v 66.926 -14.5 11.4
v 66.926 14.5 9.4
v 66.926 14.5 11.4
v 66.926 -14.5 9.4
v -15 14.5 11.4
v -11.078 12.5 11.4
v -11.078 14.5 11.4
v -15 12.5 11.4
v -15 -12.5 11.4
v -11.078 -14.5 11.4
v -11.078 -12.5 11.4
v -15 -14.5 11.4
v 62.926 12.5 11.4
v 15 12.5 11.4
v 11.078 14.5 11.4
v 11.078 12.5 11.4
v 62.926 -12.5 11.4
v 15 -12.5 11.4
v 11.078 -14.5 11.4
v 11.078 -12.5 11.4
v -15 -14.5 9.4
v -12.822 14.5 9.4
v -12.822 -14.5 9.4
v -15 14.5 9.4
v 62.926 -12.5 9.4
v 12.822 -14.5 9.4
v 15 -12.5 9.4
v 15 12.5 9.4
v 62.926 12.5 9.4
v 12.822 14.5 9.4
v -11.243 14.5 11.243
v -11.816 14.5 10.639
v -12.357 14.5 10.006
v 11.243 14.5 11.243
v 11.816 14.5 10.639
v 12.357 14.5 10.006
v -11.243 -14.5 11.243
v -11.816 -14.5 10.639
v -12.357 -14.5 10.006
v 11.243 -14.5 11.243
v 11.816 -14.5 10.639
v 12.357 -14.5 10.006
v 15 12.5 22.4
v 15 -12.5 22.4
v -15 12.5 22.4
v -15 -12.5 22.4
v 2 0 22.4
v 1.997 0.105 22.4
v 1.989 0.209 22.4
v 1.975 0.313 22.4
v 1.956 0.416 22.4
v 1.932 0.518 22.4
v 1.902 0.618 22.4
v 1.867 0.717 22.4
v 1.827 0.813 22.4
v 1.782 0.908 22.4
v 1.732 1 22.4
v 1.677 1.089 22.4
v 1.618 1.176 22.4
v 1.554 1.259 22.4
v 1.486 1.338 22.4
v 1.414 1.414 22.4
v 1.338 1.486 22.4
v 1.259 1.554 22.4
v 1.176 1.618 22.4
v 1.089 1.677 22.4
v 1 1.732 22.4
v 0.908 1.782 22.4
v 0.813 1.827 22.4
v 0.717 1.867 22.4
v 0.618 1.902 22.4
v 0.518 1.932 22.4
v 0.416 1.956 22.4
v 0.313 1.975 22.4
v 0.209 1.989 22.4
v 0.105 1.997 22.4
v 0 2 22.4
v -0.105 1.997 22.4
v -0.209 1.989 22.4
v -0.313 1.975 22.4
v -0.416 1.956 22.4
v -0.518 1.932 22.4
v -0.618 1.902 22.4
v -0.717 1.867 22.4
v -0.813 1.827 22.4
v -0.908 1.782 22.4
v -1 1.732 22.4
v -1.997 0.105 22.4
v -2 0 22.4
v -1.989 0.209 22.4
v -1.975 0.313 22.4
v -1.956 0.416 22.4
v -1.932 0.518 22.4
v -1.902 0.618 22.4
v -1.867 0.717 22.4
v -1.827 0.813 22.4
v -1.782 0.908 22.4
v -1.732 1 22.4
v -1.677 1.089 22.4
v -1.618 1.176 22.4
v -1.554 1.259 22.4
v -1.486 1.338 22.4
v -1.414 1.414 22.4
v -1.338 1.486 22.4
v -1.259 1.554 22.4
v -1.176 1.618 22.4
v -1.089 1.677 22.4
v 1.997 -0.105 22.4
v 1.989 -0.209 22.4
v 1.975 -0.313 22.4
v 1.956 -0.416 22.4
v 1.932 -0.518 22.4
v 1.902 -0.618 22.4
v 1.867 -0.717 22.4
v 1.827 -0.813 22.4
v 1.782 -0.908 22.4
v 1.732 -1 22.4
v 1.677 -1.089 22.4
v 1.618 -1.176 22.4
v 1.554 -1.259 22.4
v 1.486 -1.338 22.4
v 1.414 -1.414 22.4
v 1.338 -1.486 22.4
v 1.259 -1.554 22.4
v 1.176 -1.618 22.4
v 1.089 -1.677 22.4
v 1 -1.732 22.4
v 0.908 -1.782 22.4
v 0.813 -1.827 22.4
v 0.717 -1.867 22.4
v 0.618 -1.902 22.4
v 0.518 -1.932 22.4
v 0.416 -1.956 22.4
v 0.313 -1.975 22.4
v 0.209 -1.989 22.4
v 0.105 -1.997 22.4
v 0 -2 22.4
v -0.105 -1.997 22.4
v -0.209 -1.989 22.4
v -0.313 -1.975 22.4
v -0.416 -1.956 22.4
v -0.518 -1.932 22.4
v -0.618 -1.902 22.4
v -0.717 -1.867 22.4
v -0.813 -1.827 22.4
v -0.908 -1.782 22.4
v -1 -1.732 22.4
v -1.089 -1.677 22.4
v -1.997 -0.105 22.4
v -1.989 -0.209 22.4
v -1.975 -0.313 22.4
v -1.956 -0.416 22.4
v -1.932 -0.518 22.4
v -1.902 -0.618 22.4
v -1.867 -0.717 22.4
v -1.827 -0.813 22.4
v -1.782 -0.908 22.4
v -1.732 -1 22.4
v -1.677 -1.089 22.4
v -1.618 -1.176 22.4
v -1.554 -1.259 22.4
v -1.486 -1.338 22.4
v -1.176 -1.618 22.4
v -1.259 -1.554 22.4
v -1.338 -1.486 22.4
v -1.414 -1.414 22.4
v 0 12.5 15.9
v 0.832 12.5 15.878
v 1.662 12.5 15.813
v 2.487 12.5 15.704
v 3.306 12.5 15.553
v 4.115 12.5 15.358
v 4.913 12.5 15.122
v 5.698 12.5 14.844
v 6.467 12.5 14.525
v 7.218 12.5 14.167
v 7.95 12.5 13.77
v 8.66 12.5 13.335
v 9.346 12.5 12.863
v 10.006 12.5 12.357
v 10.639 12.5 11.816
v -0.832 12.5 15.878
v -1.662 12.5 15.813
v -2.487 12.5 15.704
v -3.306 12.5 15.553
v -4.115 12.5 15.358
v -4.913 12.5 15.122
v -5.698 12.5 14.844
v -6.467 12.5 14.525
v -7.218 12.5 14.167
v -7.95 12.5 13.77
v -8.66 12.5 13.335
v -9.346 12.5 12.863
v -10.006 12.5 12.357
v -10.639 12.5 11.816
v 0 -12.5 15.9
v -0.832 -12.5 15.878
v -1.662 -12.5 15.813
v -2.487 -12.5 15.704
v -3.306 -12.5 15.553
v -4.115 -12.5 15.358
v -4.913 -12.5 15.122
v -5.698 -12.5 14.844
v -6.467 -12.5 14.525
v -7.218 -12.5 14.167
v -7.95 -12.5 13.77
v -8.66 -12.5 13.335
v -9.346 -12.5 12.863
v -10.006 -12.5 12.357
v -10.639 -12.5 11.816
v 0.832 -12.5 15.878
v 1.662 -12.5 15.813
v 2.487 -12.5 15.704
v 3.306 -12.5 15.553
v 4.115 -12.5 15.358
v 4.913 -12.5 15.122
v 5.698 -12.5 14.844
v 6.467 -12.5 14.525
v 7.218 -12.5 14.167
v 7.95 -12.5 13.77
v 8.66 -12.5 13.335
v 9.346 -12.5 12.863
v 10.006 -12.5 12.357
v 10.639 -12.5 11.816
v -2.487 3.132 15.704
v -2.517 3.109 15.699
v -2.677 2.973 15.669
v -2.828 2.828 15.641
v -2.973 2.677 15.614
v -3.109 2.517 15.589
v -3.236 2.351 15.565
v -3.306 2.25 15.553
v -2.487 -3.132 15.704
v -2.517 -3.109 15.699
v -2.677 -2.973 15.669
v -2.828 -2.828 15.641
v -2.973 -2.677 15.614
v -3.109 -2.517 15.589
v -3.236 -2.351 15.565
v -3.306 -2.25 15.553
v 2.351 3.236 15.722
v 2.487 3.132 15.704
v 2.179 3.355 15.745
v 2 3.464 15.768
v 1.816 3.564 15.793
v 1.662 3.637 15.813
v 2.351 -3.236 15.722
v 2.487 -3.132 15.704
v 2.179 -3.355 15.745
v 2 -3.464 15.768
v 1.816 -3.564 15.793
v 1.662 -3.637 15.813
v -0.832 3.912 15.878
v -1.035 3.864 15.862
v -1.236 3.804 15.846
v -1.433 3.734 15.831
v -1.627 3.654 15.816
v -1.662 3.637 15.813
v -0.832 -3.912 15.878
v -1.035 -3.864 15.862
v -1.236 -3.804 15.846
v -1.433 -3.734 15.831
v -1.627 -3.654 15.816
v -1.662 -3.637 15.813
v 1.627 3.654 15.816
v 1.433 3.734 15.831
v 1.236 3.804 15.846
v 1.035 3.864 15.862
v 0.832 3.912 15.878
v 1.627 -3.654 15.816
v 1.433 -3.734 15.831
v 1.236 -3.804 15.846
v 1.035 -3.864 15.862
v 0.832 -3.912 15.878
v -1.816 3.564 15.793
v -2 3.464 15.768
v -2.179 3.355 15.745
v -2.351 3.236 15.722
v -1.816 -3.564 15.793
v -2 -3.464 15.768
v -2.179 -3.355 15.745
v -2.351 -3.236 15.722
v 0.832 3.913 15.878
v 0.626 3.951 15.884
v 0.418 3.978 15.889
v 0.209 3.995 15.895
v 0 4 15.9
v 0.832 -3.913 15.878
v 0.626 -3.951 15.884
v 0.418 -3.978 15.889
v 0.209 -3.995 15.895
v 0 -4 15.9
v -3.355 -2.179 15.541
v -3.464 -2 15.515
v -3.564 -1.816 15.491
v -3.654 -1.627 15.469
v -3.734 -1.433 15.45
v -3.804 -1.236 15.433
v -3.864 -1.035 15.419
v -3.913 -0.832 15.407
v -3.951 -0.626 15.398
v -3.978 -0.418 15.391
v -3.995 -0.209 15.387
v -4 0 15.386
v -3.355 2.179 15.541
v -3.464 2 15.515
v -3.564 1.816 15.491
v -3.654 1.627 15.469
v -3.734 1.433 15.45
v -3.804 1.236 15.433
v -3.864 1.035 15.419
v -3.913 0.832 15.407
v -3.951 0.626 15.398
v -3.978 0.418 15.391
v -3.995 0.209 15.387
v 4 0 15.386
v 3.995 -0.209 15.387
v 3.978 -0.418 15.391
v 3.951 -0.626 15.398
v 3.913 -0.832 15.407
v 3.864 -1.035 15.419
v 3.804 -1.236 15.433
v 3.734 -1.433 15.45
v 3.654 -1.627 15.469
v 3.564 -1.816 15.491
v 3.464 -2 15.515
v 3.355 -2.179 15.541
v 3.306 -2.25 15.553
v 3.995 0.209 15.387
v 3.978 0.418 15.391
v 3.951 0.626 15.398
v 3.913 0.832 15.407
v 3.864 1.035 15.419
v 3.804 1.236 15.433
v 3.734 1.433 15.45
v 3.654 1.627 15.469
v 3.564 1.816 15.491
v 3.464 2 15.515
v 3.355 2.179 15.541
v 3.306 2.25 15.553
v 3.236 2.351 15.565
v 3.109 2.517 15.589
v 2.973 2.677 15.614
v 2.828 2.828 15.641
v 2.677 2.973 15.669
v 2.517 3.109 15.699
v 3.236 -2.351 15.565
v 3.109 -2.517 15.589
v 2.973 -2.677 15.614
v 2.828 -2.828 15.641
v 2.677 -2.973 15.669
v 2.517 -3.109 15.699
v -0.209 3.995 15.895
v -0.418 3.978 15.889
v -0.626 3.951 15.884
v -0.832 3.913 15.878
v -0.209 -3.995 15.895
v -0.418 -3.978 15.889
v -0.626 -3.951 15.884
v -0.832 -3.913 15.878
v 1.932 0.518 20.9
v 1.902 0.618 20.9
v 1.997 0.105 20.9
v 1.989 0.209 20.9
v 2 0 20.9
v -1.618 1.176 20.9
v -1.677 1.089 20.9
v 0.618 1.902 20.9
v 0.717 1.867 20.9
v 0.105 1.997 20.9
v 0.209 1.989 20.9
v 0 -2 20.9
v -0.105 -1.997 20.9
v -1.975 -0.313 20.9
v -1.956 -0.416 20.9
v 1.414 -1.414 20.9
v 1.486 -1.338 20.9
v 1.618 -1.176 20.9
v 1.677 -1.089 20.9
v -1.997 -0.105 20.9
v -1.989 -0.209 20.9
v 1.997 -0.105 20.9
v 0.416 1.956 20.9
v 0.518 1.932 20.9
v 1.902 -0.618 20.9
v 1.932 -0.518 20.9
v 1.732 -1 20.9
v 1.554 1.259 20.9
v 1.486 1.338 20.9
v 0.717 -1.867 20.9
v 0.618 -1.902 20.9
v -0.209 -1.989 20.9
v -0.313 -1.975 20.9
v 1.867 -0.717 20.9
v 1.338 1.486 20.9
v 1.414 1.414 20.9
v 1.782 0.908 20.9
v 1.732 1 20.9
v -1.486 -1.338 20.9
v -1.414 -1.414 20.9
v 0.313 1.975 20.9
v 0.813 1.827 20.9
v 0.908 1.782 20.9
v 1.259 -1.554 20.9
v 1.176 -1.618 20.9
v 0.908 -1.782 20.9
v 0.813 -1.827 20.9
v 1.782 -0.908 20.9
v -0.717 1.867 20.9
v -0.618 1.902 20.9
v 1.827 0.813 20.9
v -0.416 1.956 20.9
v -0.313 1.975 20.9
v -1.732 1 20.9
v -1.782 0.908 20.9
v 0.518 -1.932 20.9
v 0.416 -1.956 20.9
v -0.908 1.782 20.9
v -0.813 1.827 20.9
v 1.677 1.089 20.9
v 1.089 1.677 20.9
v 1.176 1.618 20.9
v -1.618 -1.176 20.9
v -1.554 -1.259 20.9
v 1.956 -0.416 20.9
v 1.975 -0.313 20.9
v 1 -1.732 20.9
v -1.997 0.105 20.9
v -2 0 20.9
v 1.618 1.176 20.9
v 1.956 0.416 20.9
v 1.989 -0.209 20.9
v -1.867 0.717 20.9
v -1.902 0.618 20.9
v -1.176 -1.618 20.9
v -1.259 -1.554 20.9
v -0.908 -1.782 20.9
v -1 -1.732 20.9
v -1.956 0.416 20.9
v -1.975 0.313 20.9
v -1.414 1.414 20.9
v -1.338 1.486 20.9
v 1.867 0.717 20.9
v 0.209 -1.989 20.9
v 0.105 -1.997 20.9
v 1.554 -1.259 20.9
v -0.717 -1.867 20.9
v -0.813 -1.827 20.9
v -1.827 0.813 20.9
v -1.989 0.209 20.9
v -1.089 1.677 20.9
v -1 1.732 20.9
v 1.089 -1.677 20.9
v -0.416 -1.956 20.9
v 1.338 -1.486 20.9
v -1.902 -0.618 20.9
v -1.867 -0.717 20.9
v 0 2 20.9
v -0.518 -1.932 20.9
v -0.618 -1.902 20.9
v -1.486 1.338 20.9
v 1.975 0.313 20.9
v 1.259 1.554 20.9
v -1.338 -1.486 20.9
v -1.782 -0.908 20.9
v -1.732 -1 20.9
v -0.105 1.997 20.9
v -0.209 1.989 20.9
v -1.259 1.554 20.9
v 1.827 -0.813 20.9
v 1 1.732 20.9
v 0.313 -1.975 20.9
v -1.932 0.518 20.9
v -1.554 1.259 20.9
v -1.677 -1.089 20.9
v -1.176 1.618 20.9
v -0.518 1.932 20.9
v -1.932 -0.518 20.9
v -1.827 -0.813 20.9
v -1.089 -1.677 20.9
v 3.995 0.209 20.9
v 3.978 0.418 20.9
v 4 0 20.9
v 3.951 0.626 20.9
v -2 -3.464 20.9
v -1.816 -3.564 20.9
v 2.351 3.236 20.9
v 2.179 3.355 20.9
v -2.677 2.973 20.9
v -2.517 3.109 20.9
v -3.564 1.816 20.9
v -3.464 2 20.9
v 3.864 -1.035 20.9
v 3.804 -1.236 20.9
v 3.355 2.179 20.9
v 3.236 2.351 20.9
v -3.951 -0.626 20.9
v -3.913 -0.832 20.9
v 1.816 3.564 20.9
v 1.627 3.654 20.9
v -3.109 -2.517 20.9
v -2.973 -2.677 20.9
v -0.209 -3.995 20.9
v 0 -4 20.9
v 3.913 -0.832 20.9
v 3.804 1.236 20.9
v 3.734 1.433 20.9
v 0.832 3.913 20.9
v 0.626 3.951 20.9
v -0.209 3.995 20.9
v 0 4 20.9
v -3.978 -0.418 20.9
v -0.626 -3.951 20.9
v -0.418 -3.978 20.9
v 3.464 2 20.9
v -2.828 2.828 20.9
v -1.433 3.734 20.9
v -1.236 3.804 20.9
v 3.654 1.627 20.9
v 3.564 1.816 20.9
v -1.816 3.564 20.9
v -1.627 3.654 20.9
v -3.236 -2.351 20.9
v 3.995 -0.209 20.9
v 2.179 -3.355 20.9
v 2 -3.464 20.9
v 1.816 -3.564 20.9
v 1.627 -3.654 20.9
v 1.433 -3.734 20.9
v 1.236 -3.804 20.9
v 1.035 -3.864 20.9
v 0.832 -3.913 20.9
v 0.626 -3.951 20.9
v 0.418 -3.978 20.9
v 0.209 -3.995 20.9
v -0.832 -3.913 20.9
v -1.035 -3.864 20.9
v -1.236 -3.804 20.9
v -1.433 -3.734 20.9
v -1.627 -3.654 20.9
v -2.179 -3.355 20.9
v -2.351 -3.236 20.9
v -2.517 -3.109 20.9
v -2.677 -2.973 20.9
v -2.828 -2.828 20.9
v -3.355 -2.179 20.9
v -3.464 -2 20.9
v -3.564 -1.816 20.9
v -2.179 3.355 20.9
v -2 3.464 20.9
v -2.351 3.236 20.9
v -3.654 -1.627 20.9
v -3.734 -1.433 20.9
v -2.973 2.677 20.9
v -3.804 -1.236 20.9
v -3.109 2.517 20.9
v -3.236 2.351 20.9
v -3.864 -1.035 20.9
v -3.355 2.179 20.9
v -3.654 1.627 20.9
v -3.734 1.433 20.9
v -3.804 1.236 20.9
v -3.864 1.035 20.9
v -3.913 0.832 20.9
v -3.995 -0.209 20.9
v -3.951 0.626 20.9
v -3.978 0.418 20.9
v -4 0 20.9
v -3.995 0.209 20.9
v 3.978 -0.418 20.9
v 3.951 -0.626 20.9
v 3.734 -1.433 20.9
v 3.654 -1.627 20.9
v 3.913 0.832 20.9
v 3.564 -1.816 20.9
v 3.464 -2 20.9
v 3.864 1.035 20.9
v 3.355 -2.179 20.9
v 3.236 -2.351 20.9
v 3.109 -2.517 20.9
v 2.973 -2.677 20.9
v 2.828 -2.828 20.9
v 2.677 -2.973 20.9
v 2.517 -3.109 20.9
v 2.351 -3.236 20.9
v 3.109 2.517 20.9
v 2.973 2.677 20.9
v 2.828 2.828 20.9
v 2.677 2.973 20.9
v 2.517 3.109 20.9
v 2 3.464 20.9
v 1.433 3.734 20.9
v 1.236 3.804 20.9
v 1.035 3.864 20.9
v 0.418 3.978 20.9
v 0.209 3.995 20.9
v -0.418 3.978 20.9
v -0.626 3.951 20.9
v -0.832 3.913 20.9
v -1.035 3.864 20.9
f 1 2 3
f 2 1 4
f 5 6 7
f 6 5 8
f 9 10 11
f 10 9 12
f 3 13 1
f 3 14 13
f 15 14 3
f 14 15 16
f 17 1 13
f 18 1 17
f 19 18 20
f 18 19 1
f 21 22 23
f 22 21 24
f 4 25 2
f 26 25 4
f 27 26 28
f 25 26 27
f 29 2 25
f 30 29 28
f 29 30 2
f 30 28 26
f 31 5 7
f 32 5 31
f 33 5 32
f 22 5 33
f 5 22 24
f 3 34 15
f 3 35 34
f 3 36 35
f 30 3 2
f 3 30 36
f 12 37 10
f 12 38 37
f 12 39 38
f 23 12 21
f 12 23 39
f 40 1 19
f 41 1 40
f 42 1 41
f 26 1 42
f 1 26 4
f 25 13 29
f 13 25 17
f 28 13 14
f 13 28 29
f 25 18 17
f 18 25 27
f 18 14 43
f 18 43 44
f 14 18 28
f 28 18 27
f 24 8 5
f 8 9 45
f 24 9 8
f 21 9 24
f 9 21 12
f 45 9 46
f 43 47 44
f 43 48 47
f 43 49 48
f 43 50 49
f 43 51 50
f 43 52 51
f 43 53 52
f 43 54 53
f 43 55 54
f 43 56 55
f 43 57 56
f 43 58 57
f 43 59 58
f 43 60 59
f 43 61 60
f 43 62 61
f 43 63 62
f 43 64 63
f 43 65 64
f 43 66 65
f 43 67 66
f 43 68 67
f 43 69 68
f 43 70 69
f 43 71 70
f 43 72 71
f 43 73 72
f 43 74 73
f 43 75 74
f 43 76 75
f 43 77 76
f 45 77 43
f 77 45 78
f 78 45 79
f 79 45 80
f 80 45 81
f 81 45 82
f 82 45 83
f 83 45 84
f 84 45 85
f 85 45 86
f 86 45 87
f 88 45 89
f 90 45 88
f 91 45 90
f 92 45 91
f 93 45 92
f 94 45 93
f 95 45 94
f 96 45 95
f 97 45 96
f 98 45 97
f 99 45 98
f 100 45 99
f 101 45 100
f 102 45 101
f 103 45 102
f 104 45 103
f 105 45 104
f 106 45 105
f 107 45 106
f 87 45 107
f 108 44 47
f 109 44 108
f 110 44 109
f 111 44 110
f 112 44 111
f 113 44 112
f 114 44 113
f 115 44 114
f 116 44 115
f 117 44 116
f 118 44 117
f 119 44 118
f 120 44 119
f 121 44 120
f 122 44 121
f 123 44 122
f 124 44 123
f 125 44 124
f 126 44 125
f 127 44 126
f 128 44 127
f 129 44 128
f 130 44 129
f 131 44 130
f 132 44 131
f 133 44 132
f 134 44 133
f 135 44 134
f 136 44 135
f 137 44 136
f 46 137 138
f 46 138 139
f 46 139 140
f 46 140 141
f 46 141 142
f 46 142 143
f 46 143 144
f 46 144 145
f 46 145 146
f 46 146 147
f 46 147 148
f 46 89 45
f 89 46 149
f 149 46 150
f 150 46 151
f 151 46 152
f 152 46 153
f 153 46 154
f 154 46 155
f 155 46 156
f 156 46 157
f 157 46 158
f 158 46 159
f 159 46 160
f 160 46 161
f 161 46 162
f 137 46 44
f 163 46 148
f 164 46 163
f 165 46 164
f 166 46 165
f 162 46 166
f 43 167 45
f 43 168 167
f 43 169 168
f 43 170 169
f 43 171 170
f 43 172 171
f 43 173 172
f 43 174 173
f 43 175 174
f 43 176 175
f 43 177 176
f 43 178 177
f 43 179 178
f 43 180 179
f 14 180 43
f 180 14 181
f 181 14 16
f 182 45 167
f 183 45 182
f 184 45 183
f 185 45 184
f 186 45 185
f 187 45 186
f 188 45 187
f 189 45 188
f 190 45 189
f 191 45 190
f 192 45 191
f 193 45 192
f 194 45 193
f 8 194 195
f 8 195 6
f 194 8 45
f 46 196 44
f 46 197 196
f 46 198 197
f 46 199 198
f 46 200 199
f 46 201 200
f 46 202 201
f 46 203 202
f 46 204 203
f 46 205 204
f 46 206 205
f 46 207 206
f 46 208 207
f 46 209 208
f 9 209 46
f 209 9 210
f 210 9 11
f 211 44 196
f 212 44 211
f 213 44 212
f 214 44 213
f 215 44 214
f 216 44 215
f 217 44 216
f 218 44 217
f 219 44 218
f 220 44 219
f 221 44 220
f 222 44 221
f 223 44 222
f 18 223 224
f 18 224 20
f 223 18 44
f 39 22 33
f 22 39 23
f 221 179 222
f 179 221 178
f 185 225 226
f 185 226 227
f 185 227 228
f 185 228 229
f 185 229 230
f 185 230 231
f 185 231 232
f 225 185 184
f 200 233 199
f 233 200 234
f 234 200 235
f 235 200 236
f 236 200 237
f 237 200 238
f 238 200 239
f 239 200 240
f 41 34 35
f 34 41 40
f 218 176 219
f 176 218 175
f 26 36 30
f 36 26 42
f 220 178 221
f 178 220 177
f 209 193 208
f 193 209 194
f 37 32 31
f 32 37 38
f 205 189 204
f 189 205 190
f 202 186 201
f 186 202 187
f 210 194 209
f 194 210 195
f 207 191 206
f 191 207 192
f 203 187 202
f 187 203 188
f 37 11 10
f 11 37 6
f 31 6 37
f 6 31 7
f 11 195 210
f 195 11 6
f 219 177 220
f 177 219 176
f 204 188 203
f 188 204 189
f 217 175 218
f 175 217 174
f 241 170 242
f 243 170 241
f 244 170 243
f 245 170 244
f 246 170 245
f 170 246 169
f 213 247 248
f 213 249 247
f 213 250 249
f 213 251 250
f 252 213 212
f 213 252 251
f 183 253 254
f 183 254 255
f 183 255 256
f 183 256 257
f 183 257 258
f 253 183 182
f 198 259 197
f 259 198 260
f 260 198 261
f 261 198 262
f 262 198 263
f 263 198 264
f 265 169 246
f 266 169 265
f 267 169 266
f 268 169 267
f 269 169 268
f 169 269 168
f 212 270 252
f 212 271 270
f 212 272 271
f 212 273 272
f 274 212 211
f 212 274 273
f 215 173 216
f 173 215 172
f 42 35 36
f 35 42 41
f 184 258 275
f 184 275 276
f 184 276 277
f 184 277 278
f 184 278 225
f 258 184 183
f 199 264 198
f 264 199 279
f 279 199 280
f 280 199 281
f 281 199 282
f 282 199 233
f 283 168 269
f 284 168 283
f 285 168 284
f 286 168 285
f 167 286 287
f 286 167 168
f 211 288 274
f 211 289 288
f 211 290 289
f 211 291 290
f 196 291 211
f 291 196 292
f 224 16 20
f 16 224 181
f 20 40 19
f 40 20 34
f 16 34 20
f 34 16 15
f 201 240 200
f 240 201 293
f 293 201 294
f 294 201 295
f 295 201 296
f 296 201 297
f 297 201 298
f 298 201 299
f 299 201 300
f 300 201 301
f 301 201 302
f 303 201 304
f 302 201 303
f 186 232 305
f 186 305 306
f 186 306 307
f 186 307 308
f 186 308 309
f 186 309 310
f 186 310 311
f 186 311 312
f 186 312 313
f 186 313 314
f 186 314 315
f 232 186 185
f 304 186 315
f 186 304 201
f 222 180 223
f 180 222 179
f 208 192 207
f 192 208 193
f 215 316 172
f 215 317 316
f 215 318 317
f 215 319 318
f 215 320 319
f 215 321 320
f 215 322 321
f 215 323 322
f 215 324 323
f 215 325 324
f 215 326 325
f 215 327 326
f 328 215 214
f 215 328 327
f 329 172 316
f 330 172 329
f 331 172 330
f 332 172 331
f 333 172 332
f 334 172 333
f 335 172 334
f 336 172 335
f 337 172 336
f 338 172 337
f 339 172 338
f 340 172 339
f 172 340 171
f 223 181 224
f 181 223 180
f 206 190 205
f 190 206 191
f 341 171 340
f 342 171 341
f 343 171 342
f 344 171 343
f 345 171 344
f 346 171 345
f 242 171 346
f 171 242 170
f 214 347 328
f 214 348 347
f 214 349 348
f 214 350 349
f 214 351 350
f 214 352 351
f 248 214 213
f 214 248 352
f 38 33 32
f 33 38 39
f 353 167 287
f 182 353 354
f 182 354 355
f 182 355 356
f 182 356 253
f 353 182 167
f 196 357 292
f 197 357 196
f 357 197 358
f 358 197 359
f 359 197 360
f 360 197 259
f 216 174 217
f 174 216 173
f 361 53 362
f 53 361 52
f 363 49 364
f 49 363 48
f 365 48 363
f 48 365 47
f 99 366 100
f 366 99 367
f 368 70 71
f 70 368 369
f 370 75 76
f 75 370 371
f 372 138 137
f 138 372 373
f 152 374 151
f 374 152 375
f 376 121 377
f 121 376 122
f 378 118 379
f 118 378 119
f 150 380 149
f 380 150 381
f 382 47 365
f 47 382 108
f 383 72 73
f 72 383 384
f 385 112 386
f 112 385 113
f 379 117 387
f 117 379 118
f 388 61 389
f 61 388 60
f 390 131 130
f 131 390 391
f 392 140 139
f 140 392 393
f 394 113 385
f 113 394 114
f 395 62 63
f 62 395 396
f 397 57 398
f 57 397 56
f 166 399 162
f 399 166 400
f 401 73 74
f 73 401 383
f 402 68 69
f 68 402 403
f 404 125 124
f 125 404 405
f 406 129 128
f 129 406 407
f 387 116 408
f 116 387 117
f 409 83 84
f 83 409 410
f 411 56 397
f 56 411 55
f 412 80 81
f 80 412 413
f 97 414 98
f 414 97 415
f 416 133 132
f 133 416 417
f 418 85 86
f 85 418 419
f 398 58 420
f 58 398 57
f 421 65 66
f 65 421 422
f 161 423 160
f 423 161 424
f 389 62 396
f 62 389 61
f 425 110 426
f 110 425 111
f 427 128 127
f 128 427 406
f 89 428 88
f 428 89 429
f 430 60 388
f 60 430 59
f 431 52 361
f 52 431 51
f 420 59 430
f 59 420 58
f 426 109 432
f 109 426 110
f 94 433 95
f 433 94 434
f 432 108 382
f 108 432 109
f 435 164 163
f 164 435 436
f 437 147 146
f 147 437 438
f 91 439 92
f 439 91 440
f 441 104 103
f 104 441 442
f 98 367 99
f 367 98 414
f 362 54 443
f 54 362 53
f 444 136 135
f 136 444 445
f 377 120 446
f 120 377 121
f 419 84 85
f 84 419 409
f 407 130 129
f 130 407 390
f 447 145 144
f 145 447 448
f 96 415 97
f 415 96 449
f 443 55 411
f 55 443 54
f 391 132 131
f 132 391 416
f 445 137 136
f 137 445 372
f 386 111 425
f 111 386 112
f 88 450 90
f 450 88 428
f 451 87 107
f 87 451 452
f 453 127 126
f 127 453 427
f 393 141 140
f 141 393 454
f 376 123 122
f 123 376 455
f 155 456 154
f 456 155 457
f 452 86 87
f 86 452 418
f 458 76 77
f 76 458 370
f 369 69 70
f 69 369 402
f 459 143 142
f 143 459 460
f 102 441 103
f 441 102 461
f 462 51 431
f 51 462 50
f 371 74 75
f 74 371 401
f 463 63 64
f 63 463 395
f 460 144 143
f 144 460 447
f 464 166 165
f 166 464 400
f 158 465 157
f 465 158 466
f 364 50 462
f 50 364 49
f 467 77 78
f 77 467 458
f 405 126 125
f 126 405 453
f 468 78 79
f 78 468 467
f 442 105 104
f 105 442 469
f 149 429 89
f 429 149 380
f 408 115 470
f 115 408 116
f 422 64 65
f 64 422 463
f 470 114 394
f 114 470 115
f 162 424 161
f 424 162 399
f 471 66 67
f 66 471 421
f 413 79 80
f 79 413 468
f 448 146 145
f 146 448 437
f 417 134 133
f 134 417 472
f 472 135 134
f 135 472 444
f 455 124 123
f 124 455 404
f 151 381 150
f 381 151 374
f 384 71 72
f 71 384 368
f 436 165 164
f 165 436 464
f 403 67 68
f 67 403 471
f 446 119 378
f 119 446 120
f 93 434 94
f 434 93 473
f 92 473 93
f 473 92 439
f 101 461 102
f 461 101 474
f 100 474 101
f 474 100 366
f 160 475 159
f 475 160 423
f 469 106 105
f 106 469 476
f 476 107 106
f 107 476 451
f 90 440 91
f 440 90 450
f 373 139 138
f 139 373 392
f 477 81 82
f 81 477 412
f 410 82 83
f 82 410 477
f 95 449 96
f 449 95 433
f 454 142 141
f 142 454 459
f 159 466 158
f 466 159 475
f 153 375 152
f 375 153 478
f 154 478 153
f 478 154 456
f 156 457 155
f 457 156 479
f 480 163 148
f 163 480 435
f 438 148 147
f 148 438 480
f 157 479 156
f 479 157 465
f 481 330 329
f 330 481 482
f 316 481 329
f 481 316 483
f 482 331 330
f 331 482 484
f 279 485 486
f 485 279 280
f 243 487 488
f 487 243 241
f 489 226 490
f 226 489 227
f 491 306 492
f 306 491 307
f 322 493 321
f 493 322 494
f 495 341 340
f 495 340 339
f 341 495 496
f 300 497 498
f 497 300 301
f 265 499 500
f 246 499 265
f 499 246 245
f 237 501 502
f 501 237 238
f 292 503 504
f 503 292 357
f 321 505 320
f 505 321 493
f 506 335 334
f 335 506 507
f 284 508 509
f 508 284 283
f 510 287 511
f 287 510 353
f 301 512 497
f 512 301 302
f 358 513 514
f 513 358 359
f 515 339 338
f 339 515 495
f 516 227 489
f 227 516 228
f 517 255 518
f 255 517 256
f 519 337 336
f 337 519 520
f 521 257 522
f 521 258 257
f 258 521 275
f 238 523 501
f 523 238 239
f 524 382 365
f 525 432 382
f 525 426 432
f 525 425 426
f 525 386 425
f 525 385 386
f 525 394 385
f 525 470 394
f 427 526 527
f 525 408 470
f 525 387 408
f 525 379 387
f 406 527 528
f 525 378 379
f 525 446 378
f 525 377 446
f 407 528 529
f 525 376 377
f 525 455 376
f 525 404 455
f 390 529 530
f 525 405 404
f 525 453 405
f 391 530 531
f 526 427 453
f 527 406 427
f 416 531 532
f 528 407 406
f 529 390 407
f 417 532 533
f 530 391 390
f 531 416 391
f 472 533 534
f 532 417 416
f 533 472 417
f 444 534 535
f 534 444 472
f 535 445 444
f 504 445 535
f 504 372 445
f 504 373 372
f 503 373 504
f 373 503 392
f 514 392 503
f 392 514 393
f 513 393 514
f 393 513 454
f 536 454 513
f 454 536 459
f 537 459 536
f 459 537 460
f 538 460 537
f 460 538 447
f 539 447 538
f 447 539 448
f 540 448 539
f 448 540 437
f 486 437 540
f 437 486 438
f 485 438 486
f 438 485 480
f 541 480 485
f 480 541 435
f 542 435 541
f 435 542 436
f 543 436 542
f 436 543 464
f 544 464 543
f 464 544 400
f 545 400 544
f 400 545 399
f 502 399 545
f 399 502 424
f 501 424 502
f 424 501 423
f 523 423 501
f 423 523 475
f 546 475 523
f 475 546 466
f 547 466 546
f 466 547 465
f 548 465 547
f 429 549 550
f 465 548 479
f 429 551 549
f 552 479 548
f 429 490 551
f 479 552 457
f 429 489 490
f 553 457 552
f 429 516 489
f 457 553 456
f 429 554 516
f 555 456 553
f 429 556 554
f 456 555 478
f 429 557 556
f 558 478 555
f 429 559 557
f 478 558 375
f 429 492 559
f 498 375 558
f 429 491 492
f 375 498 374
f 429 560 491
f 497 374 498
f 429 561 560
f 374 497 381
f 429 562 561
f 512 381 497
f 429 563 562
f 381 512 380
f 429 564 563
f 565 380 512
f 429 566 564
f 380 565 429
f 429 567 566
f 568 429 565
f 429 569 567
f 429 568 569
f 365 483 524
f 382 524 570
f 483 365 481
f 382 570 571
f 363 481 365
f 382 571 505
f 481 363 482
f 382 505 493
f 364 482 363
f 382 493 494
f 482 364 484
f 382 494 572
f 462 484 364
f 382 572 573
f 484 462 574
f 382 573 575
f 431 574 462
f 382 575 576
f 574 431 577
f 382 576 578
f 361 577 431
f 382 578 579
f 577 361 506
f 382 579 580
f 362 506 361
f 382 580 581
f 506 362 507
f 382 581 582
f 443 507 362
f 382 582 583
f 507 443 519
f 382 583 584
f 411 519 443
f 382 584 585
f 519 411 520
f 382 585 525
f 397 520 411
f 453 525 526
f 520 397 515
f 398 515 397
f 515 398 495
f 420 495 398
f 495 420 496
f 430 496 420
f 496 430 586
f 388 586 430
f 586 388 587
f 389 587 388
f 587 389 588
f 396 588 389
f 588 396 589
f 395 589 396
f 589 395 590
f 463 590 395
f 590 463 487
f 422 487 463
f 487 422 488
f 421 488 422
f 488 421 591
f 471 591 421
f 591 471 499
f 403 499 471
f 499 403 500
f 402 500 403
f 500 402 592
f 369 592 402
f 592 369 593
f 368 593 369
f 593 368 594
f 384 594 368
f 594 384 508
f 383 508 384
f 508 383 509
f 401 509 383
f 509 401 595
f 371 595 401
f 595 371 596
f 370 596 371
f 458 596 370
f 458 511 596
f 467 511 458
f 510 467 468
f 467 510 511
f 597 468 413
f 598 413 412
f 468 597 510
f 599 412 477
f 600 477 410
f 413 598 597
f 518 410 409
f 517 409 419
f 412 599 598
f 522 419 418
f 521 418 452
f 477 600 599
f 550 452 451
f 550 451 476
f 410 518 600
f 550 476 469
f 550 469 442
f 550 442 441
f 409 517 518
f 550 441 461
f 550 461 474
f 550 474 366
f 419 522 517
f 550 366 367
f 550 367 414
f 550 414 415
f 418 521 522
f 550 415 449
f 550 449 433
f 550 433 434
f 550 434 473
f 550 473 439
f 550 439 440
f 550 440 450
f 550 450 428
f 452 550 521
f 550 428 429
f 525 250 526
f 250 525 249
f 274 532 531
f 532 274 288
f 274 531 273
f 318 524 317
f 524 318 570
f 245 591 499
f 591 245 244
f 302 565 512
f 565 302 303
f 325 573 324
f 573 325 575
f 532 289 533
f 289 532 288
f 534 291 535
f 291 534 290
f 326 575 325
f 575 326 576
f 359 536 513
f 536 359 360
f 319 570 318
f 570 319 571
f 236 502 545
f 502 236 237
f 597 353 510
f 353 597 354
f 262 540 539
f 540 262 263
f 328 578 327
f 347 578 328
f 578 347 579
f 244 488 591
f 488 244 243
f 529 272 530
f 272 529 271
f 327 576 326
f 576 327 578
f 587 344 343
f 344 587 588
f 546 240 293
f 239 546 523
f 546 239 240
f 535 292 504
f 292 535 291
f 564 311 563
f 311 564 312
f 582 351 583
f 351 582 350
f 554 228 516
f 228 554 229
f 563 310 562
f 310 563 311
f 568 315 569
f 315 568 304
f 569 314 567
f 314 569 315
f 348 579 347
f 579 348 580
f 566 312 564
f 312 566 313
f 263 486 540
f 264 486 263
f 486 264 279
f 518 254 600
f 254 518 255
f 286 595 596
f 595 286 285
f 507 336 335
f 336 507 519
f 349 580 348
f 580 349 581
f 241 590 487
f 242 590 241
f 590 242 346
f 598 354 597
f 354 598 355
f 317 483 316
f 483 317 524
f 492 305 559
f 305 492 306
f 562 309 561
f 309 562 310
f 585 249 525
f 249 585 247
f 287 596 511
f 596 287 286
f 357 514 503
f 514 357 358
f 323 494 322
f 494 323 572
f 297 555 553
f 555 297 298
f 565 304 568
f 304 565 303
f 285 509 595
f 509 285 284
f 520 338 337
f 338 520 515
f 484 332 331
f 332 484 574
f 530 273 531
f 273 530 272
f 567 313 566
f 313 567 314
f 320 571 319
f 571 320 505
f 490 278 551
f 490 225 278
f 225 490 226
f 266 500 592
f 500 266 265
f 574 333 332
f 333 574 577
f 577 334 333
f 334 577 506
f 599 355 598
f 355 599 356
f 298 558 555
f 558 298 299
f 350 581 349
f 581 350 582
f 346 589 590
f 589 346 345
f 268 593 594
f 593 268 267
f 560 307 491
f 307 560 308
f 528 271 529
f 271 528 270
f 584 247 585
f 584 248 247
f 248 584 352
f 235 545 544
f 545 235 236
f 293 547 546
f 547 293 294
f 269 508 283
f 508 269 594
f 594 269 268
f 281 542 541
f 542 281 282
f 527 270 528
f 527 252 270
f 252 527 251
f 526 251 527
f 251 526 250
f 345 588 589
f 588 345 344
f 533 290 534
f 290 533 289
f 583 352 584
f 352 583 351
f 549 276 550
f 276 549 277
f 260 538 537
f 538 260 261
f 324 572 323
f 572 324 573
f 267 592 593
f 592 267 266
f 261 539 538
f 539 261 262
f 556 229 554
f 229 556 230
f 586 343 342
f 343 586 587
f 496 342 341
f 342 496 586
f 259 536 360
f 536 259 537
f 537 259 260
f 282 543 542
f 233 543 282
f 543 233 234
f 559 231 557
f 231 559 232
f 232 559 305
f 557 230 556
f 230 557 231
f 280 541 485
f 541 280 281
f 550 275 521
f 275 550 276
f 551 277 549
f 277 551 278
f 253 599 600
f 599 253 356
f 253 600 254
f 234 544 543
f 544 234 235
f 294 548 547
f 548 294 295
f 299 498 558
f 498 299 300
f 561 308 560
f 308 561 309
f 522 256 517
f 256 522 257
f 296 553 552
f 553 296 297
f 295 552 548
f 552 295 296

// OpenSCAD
// file: vars.scad
baseRDia = 31.8;
itemRDia = 20;
blockL = 30;
blockW = 25;
slingH = 2;
slingW = 4;
screwDia = 4;
screwLength = 20;
screwHeadHeight = 4;
screwWasherDia = 8;
screwWasherHeight = 1;
screwHoleLeft = 2;
screwSpaceLeft = 2;

//constant
pi = 3.14;

//config
$fn = 120;

//math
baseCirc = baseRDia/2*pi;
itemCirc = itemRDia/2*pi;
screwHeight = screwHeadHeight+screwWasherHeight+screwSpaceLeft;
blockH = slingH*2+screwHeight+screwHoleLeft;
// main file
include <vars.scad>;

//base
module baseR(baseRDia,baseLength){
    translate([0,baseLength/2,0]){
        rotate([90,0,0]){
            cylinder(d=baseRDia,h=baseLength);
            }
        }
    }
//mainConnect
module block(blockL,blockW,blockH,baseRDia){
    translate([-blockL/2,-blockW/2,baseRDia/2-blockH/2]){
        cube([blockL,blockW,blockH]);
        }
    }
module sling(slingW,slingH,blockW,blockL,baseRDia,baseCirc){
    translate([-blockL/2,-(blockW+slingW)/2,baseRDia/2-blockH/2]){
            cube([blockL,blockW+slingW,slingH]);
            }
    difference(){
        translate([blockH,-(blockW+slingW)/2,baseRDia/2-blockH/2]){
            cube([baseCirc+slingW,blockW+slingW,slingH]);
            }
        translate([blockH,-blockW/2,baseRDia/2-blockH/2-1]){
            cube([baseCirc,blockW,slingH+2]);
            }
        }
    }
module mainBlock(slingW,slingH,blockW,blockL,blockH,baseRDia,baseCirc){
    sling(slingW,slingH,blockW,blockL,baseRDia,baseCirc);
    block(blockL,blockW,blockH,baseRDia);
    }
module screwHole(screwDia,screwLength,screwHeadHeight,screwWasherDia,screwWasherHeight,screwHoleLeft){
  cylinder(d=screwDia,h=baseRDia+blockH*2);
  translate([0,0,0]){
    cylinder(d=screwWasherDia,h=baseRDia/2+screwHeight-screwHoleLeft);
  }
}
module mainConnect(slingW,slingH,blockW,blockL,blockH,baseRDia,baseCirc){
  difference(){
      mainBlock(slingW,slingH,blockW,blockL,blockH,baseRDia,baseCirc);
      baseR(baseRDia,120);
  }
}




difference(){
mainConnect(slingW,slingH,blockW,blockL,blockH,baseRDia,baseCirc);
screwHole(screwDia,screwLength,screwHeadHeight,screwWasherDia,screwWasherHeight,screwHoleLeft);
}
